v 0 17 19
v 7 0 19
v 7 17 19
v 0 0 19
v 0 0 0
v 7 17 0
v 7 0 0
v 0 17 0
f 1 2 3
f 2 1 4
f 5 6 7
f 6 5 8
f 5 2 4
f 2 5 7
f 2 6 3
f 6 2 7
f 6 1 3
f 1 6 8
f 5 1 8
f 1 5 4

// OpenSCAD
// Generated by SolidPython 1.0.1 on 2020-07-29 00:39:26


cube(size = [7, 17, 19]);
/***********************************************
*********      SolidPython code:      **********
************************************************
 
# import packages: SolidPython
from solid import *
from solid.utils import *
from itertools import chain, combinations


class Resize:

    def __init__(self, scad_file):
        self.scad_file = scad_file
        #self.scad_file = import_scad(scad_file)
        # cone/cylinder param:
        self.r1 = 0
        self.r2 = 0
        self.h = 0
        # rectangular prism param:
        self.w = 0
        self.l = 0
        # ellipse param:
        self.r = 0

    # import OpenScad code (file name corresponds to shape)


    # classify shape + parameters
    def assign(self, param1, param2, param3):
        if self.scad_file == 'cone.scad':
            self.r1 = param1
            self.r2 = param2
            self.h = param3
        elif self.scad_file == 'cylinder.scad':
            self.r1 = param1
            self.r2 = param2
            self.h = param3
        elif self.scad_file == 'rectangularPrism.scad':
            self.h = param1
            self.l = param2
            self.w = param3
        else:
            self.r = param1
            self.h = param2

    # resize parameters
    def iterate(self):
        x = range(3, 20, 2)
        i = 1
        if self.scad_file == 'cone.scad':
            tempList = list(combinations(x, 2))
            for temp in tempList:
                param1 = temp[0]
                param2 = temp[1]
                filepath = 'produced_scad_files/' + 'cone' + str(param1) + '_' + str(param2) + '_' + '.scad'
                scad_render_to_file(cylinder(h=param1, r1=param2, r2=0), filepath)

        elif self.scad_file == 'cylinder.scad':
            tempList = list(combinations(x, 3))
            for temp in tempList:
                param1 = temp[0]
                param2 = temp[1]
                filepath = 'produced_scad_files/' + 'cylinder' + str(param1) + '_' + str(param2) + '_' + '.scad'
                scad_render_to_file(cylinder(h=param1, r1=param2, r2=param2), filepath)

        elif self.scad_file == 'rectangularPrism.scad':
            tempList = list(combinations(x, 3))
            for temp in tempList:
                param1 = temp[0]
                param2 = temp[1]
                param3 = temp[2]
                filepath = 'produced_scad_files/' + 'rectangularPrism' + str(param1) + '_' + str(param2) + '_' + str(
                    param3) + '.scad'
                scad_render_to_file(cube(size=(param1, param2, param3)), filepath)

        elif self.scad_file == 'ellipse.scad':
            tempList = list(combinations(x, 4))
            for temp in tempList:
                param1 = temp[0]
                param2 = temp[1]
                param3 = temp[2]
                param4 = temp[3]
                filepath = 'produced_scad_files/' + 'ellipse' + str(param1) + '_' + str(param2) + '_' + str(param3) + '_' + str(param4) + '.scad'
                scad_render_to_file(scale([param1, param2, param3])(sphere(r=param4)), filepath)

    def render_to_scadfile(self):
        scad_render_to_file(scad, 'example.scad') 
 
************************************************/
